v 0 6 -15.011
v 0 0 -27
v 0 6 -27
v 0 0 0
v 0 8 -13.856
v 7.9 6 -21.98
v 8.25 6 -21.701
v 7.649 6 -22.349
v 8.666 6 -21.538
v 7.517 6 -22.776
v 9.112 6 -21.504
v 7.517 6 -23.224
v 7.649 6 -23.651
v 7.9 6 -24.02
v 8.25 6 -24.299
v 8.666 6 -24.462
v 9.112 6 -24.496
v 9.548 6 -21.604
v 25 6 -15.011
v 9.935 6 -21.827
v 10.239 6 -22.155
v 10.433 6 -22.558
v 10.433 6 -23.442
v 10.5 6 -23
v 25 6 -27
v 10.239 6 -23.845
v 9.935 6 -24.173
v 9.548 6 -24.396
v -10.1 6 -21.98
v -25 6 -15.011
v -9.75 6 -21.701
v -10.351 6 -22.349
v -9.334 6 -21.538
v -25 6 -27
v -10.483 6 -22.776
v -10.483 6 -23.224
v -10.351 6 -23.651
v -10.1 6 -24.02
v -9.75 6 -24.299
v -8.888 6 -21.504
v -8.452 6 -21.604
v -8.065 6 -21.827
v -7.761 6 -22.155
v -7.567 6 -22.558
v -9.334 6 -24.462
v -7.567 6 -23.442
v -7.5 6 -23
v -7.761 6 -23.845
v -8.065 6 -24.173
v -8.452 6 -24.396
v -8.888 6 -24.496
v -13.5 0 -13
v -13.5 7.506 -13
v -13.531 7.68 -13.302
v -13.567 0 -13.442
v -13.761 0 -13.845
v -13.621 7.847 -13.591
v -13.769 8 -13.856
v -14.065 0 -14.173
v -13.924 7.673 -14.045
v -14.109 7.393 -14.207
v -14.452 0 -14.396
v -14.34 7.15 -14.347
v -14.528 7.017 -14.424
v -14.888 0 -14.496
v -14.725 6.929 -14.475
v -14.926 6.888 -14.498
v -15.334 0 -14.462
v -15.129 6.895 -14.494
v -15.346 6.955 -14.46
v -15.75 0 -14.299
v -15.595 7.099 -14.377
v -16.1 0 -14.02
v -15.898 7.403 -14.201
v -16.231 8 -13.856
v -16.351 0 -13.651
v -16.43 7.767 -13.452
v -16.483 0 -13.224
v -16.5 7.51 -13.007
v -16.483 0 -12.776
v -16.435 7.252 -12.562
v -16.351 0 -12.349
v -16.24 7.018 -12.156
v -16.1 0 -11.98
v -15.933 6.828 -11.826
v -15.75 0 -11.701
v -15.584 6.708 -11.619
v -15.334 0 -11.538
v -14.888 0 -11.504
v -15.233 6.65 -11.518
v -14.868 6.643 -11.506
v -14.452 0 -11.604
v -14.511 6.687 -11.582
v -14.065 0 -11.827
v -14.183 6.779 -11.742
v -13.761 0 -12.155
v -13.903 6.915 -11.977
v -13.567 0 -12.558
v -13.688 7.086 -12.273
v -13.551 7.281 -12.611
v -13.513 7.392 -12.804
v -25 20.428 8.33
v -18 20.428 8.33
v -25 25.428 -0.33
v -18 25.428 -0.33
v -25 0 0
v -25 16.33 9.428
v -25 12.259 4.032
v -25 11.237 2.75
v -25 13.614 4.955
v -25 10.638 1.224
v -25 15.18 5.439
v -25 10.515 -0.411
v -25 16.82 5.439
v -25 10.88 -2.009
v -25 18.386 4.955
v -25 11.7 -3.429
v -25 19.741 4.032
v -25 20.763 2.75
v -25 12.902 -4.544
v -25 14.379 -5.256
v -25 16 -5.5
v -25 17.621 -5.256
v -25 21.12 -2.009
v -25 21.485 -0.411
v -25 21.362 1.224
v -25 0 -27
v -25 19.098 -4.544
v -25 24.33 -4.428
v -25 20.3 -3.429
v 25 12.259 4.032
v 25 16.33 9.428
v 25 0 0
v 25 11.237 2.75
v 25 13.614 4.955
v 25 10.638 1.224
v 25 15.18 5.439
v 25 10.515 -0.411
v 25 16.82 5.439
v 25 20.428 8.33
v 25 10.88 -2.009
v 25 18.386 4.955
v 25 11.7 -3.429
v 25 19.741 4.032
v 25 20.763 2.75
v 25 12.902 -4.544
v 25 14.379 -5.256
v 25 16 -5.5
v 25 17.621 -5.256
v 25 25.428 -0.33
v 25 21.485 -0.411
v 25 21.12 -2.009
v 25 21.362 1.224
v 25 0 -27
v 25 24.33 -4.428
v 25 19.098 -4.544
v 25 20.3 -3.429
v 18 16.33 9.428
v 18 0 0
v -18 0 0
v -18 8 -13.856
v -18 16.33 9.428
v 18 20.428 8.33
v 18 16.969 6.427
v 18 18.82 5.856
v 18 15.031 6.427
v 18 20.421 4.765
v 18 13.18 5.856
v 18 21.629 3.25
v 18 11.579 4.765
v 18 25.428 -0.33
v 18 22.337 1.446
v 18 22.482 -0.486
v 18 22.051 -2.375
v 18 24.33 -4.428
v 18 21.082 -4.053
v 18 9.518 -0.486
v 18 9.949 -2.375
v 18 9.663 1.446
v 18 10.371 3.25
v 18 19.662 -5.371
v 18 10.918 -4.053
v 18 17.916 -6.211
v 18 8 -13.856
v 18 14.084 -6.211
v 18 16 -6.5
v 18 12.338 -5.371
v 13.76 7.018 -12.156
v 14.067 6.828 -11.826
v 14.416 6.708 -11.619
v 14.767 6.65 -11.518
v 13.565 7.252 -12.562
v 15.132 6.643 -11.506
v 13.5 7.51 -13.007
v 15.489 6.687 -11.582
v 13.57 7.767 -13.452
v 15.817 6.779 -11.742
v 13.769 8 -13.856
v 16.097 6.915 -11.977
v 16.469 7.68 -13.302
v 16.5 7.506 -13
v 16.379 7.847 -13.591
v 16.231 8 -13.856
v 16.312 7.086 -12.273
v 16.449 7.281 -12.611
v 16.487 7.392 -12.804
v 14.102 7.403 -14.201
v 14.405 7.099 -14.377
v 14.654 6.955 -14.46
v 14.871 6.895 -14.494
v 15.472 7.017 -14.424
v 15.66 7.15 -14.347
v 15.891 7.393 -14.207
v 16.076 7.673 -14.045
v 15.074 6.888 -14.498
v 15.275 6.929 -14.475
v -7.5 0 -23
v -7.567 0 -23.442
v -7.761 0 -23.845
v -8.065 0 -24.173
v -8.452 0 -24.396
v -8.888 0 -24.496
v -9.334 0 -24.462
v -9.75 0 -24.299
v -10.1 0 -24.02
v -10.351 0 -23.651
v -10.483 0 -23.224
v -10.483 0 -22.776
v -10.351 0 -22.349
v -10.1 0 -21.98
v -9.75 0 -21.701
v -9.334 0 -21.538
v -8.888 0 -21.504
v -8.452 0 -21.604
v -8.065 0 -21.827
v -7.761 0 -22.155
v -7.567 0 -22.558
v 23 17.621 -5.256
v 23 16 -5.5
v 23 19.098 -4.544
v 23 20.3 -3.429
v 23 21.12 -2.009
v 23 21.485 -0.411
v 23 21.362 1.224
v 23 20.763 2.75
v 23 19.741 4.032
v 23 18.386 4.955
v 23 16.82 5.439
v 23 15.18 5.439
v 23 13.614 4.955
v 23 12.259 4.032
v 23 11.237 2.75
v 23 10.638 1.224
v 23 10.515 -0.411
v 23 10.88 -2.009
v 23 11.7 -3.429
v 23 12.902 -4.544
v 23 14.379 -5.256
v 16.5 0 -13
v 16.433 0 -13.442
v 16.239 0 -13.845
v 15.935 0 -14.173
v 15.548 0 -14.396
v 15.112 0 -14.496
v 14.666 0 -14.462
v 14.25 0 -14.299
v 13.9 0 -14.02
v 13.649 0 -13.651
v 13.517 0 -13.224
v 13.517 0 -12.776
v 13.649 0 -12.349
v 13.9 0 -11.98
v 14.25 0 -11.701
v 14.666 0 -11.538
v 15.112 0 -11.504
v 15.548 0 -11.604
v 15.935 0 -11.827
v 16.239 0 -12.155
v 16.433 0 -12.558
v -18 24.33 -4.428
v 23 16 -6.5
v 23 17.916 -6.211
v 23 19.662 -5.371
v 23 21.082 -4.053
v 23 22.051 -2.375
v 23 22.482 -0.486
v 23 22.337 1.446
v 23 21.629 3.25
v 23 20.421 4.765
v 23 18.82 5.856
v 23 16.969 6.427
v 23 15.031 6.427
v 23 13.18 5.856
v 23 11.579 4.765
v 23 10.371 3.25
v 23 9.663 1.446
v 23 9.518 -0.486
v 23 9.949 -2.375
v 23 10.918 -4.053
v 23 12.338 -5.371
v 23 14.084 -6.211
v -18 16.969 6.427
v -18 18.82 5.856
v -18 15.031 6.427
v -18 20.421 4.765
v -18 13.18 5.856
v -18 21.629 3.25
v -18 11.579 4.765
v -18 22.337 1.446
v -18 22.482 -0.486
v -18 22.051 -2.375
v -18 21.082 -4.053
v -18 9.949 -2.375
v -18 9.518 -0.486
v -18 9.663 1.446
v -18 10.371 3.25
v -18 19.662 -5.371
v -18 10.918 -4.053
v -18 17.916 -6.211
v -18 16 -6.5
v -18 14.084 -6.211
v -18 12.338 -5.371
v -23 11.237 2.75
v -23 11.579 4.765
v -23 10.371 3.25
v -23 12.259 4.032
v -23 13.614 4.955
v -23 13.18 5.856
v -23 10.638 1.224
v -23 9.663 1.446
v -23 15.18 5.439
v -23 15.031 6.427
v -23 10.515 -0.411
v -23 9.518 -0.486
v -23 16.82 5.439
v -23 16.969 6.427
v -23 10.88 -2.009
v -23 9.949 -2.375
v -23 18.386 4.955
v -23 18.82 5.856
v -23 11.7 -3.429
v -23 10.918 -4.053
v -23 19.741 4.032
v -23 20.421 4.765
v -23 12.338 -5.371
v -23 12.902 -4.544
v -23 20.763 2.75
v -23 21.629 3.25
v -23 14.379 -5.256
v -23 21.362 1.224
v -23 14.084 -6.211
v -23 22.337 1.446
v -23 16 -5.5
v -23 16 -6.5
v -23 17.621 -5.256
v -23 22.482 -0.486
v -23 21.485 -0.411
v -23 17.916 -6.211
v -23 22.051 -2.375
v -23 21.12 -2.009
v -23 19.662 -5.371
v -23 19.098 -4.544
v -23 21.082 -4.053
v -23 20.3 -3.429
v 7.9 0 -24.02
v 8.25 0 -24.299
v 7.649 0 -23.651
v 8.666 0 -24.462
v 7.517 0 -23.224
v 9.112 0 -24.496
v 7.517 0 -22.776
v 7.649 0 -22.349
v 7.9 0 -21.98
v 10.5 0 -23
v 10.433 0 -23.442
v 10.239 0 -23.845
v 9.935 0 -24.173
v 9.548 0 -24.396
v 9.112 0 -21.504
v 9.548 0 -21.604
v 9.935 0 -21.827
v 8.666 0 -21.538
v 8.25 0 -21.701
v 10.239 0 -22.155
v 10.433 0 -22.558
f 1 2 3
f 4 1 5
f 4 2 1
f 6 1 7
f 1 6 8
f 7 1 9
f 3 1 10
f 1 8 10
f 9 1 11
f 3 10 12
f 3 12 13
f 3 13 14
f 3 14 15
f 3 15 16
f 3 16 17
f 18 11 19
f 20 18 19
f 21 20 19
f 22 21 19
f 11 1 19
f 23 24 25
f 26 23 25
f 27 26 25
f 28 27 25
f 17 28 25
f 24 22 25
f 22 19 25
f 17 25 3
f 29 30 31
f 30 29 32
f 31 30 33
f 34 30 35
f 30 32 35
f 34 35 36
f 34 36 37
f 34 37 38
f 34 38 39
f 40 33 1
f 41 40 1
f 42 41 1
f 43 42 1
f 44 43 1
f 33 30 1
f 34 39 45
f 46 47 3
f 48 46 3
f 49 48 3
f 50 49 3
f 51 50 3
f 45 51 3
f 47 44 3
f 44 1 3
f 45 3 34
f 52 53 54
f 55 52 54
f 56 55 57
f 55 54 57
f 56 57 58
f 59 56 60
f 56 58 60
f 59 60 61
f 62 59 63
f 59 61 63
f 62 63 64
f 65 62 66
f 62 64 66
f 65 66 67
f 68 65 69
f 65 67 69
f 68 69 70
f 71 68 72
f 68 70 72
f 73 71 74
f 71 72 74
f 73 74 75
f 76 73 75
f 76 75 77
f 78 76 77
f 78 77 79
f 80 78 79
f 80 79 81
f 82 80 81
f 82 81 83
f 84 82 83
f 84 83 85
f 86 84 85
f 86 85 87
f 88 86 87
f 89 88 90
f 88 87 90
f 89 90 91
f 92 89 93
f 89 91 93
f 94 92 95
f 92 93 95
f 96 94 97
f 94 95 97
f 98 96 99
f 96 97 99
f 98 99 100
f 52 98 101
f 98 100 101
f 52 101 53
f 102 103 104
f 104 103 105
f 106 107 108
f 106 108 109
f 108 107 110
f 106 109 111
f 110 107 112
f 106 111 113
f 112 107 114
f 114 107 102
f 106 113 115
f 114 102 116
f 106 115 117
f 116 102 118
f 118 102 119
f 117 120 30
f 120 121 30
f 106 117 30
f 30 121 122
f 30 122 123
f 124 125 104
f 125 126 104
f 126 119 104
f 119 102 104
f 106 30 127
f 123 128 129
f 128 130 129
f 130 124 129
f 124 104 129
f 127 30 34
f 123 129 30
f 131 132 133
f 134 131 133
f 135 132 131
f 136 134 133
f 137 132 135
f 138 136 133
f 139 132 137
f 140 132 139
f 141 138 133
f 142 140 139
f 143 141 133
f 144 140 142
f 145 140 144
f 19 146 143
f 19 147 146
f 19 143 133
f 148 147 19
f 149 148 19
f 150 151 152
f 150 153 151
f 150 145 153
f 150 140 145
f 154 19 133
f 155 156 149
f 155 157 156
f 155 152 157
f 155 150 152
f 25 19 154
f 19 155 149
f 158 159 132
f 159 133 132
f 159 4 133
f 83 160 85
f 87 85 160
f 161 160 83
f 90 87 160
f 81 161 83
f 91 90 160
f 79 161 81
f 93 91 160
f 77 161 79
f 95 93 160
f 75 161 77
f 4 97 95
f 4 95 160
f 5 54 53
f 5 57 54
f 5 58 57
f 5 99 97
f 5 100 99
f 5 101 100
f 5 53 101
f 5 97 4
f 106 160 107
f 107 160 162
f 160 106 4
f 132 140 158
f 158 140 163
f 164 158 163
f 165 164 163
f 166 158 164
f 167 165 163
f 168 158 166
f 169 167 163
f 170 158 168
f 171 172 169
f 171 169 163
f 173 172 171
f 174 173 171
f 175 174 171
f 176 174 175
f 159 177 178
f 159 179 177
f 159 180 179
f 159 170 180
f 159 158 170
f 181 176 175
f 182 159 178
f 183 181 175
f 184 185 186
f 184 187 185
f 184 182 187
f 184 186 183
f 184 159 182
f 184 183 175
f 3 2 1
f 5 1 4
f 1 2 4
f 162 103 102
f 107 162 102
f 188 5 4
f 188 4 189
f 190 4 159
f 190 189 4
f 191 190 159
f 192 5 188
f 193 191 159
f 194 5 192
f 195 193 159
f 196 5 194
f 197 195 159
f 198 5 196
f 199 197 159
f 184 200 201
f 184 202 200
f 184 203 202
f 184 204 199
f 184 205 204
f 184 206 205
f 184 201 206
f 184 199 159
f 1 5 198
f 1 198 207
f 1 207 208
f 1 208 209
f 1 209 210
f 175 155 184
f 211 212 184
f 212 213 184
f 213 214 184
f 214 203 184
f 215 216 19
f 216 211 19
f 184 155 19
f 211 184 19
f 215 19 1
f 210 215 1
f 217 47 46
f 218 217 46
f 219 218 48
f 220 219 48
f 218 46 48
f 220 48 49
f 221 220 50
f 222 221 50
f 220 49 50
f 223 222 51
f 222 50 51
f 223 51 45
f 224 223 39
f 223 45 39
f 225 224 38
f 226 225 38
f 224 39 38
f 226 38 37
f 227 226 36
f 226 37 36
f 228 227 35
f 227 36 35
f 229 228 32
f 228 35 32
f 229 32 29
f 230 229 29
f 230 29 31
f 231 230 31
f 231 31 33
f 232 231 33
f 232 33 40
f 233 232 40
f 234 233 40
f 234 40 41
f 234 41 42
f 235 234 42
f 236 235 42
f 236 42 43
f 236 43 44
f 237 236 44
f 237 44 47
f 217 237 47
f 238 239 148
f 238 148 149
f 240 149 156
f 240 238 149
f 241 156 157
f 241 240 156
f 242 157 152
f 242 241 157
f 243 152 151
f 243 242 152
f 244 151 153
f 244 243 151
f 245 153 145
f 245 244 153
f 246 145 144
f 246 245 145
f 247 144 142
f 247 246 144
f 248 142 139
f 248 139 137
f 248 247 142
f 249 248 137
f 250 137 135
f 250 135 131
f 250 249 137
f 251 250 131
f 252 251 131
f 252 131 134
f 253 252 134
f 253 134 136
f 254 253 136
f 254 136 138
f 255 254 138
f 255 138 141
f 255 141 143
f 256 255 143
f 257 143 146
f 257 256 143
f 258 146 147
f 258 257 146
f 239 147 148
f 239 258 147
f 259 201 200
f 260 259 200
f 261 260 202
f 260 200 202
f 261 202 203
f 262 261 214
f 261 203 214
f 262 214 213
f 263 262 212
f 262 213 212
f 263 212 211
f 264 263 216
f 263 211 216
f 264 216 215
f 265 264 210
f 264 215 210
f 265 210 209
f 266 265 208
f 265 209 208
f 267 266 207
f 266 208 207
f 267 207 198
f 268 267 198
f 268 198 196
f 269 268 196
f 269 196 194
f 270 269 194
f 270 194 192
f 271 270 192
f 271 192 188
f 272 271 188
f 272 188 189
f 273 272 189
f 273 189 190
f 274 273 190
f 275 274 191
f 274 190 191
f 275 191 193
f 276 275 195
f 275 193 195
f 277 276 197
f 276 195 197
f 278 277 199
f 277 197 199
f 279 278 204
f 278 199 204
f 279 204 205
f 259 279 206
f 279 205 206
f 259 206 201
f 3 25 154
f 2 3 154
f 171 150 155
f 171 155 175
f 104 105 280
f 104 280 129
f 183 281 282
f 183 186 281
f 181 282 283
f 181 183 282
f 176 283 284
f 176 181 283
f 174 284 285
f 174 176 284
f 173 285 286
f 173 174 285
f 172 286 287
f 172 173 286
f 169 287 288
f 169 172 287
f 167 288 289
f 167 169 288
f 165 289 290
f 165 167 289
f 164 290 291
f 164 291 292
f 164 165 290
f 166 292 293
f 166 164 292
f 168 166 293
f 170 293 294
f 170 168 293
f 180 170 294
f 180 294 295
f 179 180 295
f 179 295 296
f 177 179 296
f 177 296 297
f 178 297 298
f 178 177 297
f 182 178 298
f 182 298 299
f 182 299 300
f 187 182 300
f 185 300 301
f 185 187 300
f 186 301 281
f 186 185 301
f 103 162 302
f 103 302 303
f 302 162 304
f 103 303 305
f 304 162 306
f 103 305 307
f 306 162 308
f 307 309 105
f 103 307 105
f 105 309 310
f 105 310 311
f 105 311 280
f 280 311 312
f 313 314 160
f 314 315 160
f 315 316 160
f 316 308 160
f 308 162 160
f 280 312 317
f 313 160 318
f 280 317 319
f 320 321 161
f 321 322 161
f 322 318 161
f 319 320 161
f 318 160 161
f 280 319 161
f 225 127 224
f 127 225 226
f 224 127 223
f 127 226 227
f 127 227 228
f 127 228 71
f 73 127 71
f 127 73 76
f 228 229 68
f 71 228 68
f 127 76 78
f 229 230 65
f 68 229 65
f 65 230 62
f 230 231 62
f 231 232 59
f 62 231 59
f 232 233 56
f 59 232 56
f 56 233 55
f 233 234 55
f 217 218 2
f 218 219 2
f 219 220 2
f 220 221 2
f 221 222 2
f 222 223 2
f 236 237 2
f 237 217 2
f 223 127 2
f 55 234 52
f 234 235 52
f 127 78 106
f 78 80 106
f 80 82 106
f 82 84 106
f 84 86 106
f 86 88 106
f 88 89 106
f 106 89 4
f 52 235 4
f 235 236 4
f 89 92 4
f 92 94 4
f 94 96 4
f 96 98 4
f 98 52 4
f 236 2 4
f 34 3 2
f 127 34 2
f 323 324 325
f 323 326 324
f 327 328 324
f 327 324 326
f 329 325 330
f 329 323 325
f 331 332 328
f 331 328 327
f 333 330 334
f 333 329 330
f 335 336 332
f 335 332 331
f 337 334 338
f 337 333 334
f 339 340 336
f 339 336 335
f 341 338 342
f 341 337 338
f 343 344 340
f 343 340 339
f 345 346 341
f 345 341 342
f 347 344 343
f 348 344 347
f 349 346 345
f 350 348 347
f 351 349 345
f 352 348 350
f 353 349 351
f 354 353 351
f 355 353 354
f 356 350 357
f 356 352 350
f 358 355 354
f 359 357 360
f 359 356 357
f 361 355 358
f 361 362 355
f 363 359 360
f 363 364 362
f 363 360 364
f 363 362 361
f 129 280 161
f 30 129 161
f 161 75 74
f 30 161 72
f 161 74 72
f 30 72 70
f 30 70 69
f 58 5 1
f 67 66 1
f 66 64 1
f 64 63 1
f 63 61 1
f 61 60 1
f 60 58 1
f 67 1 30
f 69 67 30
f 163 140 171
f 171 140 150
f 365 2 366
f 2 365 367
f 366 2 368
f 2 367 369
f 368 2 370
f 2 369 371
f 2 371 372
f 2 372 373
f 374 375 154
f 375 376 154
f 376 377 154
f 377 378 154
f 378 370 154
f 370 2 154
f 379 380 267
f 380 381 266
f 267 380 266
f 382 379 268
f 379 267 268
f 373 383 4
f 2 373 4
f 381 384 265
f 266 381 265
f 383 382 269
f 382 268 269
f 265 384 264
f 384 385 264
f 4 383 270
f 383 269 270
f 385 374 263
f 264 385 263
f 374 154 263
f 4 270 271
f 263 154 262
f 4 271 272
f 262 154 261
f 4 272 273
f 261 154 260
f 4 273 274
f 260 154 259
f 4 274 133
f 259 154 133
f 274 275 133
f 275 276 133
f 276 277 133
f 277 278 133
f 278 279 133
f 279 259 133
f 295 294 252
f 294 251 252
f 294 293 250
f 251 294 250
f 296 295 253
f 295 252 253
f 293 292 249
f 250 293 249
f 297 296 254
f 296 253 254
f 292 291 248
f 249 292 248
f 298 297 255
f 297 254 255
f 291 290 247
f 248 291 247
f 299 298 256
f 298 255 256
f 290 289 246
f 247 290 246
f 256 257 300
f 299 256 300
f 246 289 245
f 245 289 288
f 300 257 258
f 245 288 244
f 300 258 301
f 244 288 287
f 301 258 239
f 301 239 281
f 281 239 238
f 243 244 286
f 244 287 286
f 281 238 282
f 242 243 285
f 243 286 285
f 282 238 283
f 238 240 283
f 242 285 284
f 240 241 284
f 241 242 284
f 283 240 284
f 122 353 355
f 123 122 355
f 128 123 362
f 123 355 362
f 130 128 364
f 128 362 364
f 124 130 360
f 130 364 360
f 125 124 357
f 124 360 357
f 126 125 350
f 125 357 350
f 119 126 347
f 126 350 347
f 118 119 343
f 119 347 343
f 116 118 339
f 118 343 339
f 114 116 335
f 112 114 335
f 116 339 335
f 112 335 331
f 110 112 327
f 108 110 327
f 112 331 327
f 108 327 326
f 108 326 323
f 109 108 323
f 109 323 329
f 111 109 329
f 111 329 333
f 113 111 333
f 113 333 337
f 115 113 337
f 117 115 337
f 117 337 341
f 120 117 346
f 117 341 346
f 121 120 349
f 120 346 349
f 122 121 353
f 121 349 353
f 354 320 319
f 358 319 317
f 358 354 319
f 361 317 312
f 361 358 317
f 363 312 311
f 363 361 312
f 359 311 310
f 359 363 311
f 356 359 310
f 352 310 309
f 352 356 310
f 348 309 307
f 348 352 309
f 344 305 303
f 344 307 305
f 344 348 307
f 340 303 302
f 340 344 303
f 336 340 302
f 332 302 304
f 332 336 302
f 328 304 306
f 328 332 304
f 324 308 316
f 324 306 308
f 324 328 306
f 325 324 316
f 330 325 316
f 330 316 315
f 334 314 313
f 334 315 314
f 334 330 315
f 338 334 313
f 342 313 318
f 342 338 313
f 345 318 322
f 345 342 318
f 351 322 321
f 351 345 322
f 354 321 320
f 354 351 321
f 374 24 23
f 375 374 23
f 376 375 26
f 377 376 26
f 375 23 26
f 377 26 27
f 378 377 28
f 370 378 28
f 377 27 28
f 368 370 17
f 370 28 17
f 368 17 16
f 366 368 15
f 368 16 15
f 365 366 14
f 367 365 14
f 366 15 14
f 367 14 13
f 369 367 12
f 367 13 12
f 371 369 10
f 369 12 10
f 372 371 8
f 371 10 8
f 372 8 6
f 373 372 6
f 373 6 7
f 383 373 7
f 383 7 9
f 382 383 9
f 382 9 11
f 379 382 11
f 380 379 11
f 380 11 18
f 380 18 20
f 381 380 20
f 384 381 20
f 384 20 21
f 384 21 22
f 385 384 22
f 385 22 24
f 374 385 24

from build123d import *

# Parameters (mm, degrees)
SKETCH_1_R          = 6.5
EXTRUDE_1_DEPTH     = 25
CHAMFER_1_SIZE      = 3
CUT_EXTRUDE_START   = -21.856406
SKETCH_2_W          = 36
SKETCH_2_H          = 16
CUT_EXTRUDE_1_DEPTH = 21.856406
EXTRUDE_START       = -2
SKETCH_3_R          = 6.5
SKETCH_3_R_2        = 5.5
EXTRUDE_2_DEPTH     = 2
HOLE_WIZARD_M3_1_D  = 3


with BuildPart() as part:
    # 草图1 → 凸台-拉伸1 (new, symmetric)
    with BuildSketch(Plane(origin=(0, 0, 0), x_dir=(0, 0, -1), z_dir=(1, 0, 0))):
        Polygon((0, 0), (-10.92820323, 18.92820323), (2.92820323, 26.92820323), (15.011106999, 6), (27, 6), (27, 0), align=None)
        with Locations((0, 16)):
            Circle(SKETCH_1_R, mode=Mode.SUBTRACT)
    extrude(amount=EXTRUDE_1_DEPTH, both=True)

    # 倒角1
    chamfer_1_edges = [part.edges().sort_by_distance(p)[0] for p in [
        (0, 18.92820323, 10.92820323),
        (0, 26.92820323, -2.92820323),
    ]]
    chamfer(chamfer_1_edges, length=CHAMFER_1_SIZE)

    # 草图2 → 切除-拉伸1 (cut)
    with BuildSketch(Plane(origin=(0, 18.92820323, 10.92820323), x_dir=(1, 0, 0), z_dir=(0, 0.8660254037844396, 0.49999999999999845)).offset(CUT_EXTRUDE_START)):
        with Locations((0, 8)):
            Rectangle(SKETCH_2_W, SKETCH_2_H)
    extrude(amount=CUT_EXTRUDE_1_DEPTH, mode=Mode.SUBTRACT)

    # 草图3 → 凸台-拉伸2 (add)
    with BuildSketch(Plane(origin=(25, 0, 0), x_dir=(0, 0, -1), z_dir=(1, 0, 0)).offset(EXTRUDE_START)):
        with Locations((0, 16)):
            Circle(SKETCH_3_R)
        with Locations((0, 16)):
            Circle(SKETCH_3_R_2, mode=Mode.SUBTRACT)
    extrude_2 = extrude(amount=EXTRUDE_2_DEPTH)

    # 镜向1: 凸台-拉伸2 across plane
    add(extrude_2.mirror(Plane(origin=(0, 0, 0), x_dir=(0, 0, 1), z_dir=(1, 0, 0))))

    # M3 螺纹孔1 (through all)
    with Locations(Plane(origin=(0, 0, 0), x_dir=(-1, 0, 0), z_dir=(0, -1, 0))):
        with Locations((-15, 13), (-9, 23), (9, 23), (15, 13)):
            Hole(HOLE_WIZARD_M3_1_D / 2)


with BuildPart() as body_2:
    # Split Bodies 1: the piece on the far side of the plane
    add(part.part)
    split(bisect_by=Plane(origin=(0, 0, 0), x_dir=(0, 0, 1), z_dir=(1, 0, 0)), keep=Keep.BOTTOM)


with BuildPart() as part_1:
    add(part.part)

    # Split Bodies 1
    split(bisect_by=Plane(origin=(0, 0, 0), x_dir=(0, 0, 1), z_dir=(1, 0, 0)), keep=Keep.TOP)


solid = Compound([body_2.part, part_1.part])
